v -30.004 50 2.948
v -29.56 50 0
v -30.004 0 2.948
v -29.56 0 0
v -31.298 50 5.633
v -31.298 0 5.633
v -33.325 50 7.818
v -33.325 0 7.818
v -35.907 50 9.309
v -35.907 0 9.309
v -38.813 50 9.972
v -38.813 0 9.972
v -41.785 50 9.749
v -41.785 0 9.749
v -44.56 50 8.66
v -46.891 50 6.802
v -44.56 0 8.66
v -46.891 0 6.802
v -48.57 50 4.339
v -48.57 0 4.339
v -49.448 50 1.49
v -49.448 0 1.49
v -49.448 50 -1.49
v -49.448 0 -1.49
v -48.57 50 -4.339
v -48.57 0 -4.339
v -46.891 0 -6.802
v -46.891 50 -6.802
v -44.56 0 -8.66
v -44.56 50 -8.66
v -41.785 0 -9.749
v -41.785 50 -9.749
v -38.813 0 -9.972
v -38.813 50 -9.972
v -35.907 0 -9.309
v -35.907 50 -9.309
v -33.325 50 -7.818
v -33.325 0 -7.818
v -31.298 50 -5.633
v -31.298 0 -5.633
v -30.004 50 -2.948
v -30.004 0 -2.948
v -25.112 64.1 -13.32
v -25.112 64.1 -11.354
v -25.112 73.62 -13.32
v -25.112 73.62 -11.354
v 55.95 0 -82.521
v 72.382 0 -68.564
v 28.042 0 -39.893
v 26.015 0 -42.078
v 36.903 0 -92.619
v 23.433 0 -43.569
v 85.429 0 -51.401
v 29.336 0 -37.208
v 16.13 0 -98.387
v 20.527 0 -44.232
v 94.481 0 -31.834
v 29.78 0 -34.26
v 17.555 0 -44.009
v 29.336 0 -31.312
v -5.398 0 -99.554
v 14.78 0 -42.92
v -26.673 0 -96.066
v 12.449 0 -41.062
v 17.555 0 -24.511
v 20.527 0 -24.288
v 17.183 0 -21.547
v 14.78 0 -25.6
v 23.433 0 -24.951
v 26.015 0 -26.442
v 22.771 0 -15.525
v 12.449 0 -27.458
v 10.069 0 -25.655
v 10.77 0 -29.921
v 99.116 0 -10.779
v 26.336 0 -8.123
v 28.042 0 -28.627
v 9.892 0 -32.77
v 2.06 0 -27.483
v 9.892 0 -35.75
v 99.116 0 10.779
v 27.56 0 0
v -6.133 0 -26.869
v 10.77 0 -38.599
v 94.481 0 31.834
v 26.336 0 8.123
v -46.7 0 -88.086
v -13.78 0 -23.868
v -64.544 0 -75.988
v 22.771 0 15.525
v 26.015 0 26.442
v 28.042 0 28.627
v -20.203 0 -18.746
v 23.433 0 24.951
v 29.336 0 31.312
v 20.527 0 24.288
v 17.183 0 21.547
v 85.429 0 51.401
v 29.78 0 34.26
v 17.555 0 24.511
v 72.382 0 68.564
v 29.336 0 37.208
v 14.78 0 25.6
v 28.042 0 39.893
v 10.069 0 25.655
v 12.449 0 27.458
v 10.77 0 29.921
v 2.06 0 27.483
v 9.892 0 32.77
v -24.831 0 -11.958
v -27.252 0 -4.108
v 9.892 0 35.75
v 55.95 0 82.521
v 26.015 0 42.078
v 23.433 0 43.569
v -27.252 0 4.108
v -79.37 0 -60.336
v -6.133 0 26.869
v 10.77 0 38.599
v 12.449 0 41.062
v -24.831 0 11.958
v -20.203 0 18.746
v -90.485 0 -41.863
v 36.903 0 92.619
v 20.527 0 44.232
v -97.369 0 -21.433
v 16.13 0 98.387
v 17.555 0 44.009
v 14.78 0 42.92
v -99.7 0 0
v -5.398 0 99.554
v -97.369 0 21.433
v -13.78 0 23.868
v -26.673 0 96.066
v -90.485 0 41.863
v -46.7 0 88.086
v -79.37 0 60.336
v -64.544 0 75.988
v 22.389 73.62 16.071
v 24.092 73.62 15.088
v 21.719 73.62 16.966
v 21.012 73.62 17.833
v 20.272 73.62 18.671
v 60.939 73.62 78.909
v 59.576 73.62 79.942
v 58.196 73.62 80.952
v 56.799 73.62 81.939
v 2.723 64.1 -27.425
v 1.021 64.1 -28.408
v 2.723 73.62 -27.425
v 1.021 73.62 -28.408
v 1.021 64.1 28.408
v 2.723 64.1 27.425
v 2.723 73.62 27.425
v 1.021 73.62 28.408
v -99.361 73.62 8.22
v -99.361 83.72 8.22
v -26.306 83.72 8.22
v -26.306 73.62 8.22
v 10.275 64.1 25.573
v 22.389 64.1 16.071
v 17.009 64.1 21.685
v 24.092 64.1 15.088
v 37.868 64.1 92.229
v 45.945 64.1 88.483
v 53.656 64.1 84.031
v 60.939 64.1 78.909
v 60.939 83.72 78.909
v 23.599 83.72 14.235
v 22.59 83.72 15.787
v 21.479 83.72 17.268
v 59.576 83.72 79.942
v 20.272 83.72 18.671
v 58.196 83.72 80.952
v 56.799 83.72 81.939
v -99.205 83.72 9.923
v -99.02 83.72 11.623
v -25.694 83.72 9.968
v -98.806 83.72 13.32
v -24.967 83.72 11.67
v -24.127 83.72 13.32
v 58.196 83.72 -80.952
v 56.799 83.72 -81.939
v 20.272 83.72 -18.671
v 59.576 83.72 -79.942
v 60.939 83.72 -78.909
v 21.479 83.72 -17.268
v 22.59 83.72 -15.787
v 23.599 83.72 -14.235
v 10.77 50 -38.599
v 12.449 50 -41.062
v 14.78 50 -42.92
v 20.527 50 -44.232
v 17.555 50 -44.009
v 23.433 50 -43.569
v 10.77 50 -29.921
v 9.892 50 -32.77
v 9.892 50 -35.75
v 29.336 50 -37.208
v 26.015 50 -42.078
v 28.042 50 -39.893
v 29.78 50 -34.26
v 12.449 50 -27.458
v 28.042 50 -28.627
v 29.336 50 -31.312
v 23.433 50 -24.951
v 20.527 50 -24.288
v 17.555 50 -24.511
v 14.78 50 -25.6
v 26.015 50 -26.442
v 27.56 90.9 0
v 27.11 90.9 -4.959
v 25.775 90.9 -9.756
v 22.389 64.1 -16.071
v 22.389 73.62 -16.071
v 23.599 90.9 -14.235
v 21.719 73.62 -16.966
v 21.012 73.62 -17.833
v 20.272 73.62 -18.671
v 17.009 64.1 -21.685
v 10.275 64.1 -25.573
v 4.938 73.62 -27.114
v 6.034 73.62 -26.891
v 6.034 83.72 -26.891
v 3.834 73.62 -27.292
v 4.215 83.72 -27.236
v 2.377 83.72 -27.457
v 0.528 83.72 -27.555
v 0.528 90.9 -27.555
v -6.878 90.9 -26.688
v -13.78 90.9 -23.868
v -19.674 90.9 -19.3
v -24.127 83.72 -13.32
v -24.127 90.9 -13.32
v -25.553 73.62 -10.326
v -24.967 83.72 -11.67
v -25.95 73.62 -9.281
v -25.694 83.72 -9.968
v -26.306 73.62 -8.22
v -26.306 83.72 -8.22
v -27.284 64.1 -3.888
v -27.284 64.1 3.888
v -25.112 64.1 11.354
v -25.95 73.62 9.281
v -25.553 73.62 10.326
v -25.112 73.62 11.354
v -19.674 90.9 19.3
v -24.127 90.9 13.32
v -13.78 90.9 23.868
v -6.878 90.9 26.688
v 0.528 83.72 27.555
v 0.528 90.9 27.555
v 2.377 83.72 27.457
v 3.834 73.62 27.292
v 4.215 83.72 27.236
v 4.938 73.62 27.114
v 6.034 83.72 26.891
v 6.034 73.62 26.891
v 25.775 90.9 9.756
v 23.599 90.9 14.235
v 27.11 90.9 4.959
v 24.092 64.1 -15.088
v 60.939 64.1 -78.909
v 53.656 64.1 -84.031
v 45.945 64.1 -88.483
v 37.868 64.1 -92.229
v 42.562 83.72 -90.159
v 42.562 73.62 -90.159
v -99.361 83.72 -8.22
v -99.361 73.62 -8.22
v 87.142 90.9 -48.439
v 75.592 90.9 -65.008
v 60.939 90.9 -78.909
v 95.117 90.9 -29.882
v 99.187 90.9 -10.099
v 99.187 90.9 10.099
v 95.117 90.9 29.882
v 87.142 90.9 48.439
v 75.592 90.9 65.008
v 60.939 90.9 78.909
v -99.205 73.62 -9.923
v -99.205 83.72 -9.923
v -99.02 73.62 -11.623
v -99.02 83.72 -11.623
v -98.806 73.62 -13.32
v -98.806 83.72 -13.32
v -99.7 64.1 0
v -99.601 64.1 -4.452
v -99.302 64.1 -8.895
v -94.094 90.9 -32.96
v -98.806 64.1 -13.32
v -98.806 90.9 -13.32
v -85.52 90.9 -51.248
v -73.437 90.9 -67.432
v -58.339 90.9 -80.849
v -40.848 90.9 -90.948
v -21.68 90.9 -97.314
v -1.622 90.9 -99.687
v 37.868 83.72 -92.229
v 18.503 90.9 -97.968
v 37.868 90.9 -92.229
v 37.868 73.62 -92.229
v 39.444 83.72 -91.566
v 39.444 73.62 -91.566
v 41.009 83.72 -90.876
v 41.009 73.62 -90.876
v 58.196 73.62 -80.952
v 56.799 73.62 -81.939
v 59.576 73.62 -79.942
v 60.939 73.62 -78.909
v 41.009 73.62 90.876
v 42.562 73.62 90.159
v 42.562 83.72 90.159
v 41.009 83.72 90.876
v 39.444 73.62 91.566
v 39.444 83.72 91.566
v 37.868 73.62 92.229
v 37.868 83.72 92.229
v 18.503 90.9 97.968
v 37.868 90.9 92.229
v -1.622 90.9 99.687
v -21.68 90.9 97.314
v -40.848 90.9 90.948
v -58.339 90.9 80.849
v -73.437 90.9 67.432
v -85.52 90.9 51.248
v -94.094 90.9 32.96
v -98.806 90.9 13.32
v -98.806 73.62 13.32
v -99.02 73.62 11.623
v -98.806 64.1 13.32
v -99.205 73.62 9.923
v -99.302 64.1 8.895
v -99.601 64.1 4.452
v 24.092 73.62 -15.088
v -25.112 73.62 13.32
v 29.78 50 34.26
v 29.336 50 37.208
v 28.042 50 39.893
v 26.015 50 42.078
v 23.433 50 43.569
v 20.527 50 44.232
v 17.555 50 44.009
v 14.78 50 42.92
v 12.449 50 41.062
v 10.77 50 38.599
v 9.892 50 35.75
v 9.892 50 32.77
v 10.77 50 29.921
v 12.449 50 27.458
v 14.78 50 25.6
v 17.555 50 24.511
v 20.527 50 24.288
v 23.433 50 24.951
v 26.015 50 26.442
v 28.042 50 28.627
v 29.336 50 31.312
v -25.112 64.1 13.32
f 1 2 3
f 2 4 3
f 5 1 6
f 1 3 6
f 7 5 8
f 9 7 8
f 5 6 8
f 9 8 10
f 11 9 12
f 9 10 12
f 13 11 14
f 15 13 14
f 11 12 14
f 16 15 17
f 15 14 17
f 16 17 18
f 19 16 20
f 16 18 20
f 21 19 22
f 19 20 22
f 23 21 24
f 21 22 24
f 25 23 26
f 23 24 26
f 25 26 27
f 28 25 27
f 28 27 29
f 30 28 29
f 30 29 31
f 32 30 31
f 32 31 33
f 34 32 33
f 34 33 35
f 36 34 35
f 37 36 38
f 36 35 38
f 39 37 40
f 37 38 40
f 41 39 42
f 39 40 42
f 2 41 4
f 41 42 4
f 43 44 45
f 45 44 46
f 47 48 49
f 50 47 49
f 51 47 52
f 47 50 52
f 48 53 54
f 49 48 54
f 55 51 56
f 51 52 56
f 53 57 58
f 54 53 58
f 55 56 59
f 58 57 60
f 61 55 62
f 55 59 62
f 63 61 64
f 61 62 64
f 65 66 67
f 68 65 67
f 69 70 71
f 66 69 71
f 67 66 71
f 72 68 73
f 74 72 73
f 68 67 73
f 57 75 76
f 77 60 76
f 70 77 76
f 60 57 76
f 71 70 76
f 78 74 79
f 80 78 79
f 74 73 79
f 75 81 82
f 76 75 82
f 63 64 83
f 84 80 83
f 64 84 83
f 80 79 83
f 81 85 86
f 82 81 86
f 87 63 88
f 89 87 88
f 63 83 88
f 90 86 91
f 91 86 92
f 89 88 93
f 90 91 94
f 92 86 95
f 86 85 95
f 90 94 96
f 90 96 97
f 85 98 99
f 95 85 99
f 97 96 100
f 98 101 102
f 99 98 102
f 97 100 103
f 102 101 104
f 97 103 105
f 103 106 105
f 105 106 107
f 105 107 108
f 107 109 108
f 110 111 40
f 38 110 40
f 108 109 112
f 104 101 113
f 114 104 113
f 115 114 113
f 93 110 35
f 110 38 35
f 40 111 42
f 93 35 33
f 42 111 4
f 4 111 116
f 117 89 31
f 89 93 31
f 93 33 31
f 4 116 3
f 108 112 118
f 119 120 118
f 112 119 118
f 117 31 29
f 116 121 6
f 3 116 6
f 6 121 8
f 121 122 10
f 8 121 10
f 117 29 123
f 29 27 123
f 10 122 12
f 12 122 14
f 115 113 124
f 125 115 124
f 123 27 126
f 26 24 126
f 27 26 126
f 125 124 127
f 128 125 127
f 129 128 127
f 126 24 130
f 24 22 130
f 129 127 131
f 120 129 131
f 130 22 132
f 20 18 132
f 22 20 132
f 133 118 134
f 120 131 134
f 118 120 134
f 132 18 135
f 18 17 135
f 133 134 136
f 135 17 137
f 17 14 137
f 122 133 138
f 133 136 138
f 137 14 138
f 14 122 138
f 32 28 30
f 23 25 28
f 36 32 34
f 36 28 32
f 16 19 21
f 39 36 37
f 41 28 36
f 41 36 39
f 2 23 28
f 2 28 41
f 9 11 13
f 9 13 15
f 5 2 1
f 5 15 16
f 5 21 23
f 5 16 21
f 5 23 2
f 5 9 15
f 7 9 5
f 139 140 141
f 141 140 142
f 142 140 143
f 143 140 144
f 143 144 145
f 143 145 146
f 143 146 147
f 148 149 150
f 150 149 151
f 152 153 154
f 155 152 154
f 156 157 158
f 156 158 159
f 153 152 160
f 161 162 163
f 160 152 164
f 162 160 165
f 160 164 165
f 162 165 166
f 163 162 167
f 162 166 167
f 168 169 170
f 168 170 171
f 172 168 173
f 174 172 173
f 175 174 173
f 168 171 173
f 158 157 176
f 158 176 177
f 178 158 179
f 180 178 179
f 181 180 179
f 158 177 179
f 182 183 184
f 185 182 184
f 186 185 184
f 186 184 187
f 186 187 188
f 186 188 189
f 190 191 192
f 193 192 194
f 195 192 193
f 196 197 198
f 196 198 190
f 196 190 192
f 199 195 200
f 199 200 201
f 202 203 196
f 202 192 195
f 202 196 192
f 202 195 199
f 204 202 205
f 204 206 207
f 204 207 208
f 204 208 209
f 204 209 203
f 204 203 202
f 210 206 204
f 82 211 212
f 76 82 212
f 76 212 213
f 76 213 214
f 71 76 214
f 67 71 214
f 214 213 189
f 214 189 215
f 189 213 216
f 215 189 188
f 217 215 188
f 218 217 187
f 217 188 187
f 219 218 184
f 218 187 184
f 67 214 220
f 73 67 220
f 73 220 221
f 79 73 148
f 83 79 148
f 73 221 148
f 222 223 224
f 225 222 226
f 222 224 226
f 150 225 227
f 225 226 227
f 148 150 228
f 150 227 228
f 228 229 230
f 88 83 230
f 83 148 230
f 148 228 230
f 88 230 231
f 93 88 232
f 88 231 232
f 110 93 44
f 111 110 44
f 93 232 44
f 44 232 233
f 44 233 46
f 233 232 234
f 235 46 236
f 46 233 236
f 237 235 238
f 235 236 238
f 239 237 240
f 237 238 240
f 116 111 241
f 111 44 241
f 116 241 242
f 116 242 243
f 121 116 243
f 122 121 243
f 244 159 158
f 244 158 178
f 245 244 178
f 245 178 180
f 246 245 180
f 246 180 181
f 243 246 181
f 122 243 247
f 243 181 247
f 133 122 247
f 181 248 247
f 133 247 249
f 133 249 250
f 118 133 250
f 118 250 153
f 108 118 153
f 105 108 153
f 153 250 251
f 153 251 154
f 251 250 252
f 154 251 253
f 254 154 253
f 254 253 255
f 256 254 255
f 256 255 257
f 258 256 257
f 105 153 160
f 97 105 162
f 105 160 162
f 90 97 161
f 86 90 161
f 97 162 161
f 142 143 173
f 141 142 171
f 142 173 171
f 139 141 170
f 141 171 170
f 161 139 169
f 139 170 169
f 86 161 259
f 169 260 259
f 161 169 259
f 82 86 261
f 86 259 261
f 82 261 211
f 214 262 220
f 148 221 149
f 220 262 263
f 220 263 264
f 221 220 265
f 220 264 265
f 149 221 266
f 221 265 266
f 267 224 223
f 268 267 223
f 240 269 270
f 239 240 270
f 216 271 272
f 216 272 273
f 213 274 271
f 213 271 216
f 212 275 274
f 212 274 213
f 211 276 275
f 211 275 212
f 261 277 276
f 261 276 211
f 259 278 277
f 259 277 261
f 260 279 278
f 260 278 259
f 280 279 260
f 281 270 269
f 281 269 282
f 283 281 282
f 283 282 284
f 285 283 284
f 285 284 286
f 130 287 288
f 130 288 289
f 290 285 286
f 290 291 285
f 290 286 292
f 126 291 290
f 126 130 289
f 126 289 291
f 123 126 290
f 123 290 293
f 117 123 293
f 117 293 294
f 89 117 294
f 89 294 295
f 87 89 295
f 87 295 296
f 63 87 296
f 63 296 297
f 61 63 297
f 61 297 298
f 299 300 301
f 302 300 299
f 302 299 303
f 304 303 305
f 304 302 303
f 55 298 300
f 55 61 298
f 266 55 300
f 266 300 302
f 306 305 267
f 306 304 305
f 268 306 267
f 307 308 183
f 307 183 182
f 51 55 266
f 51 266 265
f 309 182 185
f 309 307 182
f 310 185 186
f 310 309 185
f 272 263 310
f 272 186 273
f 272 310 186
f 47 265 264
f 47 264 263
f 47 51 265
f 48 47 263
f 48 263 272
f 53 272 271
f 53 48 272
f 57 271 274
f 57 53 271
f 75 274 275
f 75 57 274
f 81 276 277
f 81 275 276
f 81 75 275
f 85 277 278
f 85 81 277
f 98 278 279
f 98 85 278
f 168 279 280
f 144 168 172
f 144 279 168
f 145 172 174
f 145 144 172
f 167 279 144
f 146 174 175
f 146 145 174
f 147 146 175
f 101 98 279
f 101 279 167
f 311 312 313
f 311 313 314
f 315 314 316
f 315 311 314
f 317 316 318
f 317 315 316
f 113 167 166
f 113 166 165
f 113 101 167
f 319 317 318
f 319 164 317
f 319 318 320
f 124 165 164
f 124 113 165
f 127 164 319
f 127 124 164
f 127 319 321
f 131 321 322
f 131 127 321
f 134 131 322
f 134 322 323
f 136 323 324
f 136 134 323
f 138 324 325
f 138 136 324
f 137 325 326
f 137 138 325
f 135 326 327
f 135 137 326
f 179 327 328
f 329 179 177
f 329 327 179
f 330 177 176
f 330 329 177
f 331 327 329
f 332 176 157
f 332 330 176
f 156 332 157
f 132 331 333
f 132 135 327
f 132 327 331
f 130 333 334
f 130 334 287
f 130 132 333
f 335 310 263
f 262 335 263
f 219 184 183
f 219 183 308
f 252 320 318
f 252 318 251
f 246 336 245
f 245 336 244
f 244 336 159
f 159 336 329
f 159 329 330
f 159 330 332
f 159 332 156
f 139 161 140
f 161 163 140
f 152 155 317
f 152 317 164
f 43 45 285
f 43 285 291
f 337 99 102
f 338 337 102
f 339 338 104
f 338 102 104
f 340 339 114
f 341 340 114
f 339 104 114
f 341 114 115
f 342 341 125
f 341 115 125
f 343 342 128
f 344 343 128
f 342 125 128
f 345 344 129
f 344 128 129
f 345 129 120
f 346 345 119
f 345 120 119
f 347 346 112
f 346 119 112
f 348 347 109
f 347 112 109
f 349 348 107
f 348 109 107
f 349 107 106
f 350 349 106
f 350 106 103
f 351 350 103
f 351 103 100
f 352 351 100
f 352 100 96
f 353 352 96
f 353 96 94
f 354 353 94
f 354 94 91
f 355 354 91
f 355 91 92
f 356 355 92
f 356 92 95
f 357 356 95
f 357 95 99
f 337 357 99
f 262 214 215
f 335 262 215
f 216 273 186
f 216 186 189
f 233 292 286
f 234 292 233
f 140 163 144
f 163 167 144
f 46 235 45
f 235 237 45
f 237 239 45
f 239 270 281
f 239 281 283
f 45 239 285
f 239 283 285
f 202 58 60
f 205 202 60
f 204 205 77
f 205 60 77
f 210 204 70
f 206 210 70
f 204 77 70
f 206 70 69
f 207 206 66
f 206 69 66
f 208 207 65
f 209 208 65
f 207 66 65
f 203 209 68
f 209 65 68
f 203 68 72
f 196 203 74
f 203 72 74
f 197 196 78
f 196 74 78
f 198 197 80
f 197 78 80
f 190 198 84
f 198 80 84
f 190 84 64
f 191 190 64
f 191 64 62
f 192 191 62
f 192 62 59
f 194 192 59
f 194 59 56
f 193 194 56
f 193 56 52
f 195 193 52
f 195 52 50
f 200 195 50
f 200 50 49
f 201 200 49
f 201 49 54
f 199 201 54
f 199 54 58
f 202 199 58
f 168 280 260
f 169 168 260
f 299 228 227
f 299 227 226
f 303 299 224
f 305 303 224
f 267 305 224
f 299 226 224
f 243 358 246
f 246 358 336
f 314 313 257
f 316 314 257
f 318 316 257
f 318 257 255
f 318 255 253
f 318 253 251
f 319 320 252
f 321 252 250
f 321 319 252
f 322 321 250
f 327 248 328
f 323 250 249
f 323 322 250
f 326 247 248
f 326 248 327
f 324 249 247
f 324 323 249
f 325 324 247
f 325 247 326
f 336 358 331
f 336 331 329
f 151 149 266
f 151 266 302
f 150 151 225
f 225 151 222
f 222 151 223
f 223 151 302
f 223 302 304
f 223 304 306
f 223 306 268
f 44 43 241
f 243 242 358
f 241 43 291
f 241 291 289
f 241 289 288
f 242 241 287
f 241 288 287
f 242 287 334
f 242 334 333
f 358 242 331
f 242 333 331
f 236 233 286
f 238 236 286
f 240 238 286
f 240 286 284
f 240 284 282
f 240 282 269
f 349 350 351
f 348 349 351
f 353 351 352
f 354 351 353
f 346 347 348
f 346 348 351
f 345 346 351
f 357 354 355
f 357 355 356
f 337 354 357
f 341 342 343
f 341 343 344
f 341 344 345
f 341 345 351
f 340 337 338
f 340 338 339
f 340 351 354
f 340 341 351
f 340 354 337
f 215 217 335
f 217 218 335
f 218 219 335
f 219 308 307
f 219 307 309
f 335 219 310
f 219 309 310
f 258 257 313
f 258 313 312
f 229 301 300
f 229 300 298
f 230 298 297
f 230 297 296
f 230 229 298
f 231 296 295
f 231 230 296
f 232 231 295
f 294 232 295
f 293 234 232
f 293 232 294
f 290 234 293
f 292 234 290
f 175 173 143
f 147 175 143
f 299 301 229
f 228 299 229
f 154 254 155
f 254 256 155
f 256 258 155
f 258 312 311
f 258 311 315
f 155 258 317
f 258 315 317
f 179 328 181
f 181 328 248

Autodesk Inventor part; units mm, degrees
ref_plane "XZ Plane" through (0, 0, 0) normal (0, 1, 0) x (-1, 0, 0)
ref_plane "XY Plane" through (0, 0, 0) normal (0, 0, 1) x (1, 0, 0)
sketch "Sketch1" plane through (0, 0, 0) normal (0, 1, 0) x (-1, 0, 0)
  circle A0 centre (0, 0) radius 99.7
extrude "Extrusion1" add sketch "Sketch1" along normal blind 90.9
sketch "Sketch2" plane through (0, 90.9, 0) normal (0, 1, 0) x (1, 0, 0)
  circle A0 centre (0, 0) radius 27.56
  dimension "d3" = 55.12
extrude "Extrusion2" cut sketch "Sketch2" against normal blind 90.9
sketch "Sketch3" plane through (0, 90.9, 0) normal (0, 1, 0) x (1, 0, 0)
  circle A0 centre (0, 0) radius 99.7 projected
  line L0 (-99.7, 0) -> (-98.8062, 13.32)
  line L1 (-98.8062, 13.32) -> (-24.1274, 13.32)
  circle A1 centre (0, 0) radius 27.56 projected
  line L2 (-99.7, 0) -> (-98.8062, -13.32)
  line L3 (-98.8062, -13.32) -> (-24.1274, -13.32)
  line L4 (37.8676, -92.2287) -> (0.5282, -27.5549)
  line L5 (49.85, -86.3427) -> (37.8676, -92.2287)
  line L6 (49.85, -86.3427) -> (60.9386, -78.9087)
  line L7 (60.9386, -78.9087) -> (23.5992, -14.2349)
  line L8 (60.9386, 78.9087) -> (23.5992, 14.2349)
  line L9 (49.85, 86.3427) -> (60.9386, 78.9087)
  line L10 (49.85, 86.3427) -> (37.8676, 92.2287)
  line L11 (37.8676, 92.2287) -> (0.5282, 27.5549)
  line L12 (-24.1274, 13.32) -> (-24.1274, -13.32)
  line L13 (0.5282, 27.5549) -> (23.5992, 14.2349)
  line L14 (23.5992, -14.2349) -> (0.5282, -27.5549)
  dimension "d6" = 13.35
  dimension "d15" = 360
extrude "Extrusion6" cut sketch "Sketch3" against normal blind 7.18 contours L8 A1 L11 L10 L9 | L6 L5 L4 A1 L7 | L13 A1 | A1 L14 | L1 A1 L3 L2 L0
sketch "Sketch7" plane through (49.85, 83.72, -86.3427) normal (-0.5569, 0, 0.8306) x (0.8306, 0, 0.5569)
  line L0 (13.35, 7.18) -> (0, 7.18) projected
  line L1 (13.35, 0) -> (13.35, 7.18) projected
  line L2 (0, 7.18) -> (13.35, 7.18)
  line L3 (13.35, 0) -> (18.3498, 0) projected
  line L4 (13.35, 7.18) -> (13.35, 0)
  line L5 (0, 7.18) -> (0, 0) projected
  line L6 (13.35, 0) -> (0, 0)
  line L7 (0, 0) -> (0, 6.2119)
  line L8 (0, 7.18) -> (-13.2303, 7.18) projected
  line L9 (-13.2303, 4.6736) -> (0, 7.18)
  line L10 (0, 7.18) -> (0, 0)
  line L11 (-13.2303, -2.9965) -> (-13.2303, 4.6736)
  line L12 (-13.2303, 0) -> (-13.2303, 7.18) projected
  point P0 (6.675, -83.72)
extrude "Extrusion7" cut sketch "Sketch7" against normal blind 10 contours L1 L6 L5 L0
sketch "Sketch8" plane through (37.8676, 83.72, -92.2287) normal (-0.4409, 0, 0.8976) x (0.8976, 0, 0.4409)
  line L0 (0, 0) -> (0, 7.18) projected
  line L1 (-4.9998, 0) -> (0, 0) projected
  line L2 (0, 7.18) -> (0, 0)
  line L3 (0, 0) -> (13.35, 0) projected
  line L4 (0, 0) -> (13.35, 0)
  line L5 (13.35, 7.18) -> (13.35, 0) projected
  line L6 (13.35, 0) -> (13.35, 7.18)
  line L7 (0, 7.18) -> (13.35, 7.18) projected
  line L8 (13.35, 7.18) -> (0, 7.18)
  line L9 (0, 7.18) -> (0, 4.7035)
  point P0 (6.675, -83.72)
extrude "Extrusion8" cut sketch "Sketch8" against normal blind 10
sketch "Sketch10" plane through (49.85, 83.72, 86.3427) normal (-0.4409, 0, -0.8976) x (-0.8976, 0, 0.4409)
  line L0 (0, 7.18) -> (13.35, 7.18) projected
  line L1 (13.35, 7.18) -> (18.3498, 7.18) projected
  line L2 (0, 7.18) -> (13.35, 7.18)
  line L3 (13.35, 0) -> (18.3498, 0) projected
  line L4 (13.35, 7.18) -> (13.35, 0)
  line L5 (0, 0) -> (13.35, 0) projected
  line L6 (13.35, 0) -> (0, 0)
  line L7 (0, 0) -> (0, 7.18)
  line L8 (0, 7.18) -> (0, 0) projected
  point P0 (6.675, -83.72)
extrude "Extrusion9" cut sketch "Sketch10" against normal blind 10
sketch "Sketch11" plane through (60.9386, 83.72, 78.9087) normal (-0.5569, 0, -0.8306) x (-0.8306, 0, 0.5569)
  line L0 (-4.9998, 7.18) -> (0, 7.18) projected
  line L1 (96.1615, 7.18) -> (0, 7.18) projected
  line L2 (0, 7.18) -> (13.35, 7.18)
  line L3 (0, 0) -> (13.35, 0) projected
  line L4 (13.35, 7.18) -> (13.35, 0)
  line L5 (13.35, 0) -> (0, 0)
  line L6 (0, 0) -> (0, 7.18) projected
  line L7 (0, 0) -> (0, 7.18)
  point P0 (6.675, -83.72)
extrude "Extrusion10" cut sketch "Sketch11" against normal blind 10
sketch "Sketch12" plane through (0, 90.9, 0) normal (0, 1, 0) x (1, 0, 0)
  arc A0 (37.8676, -92.2287) -> (60.9386, -78.9087) centre (0, 0) ccw projected
  arc A1 (-99.7, 0) -> (-98.8062, -13.32) centre (0, 0) ccw projected
  arc A2 (60.9386, 78.9087) -> (37.8676, 92.2287) centre (0, 0) ccw projected
  circle A3 centre (0, 0) radius 99.7 projected
  arc A4 (-98.8062, -13.32) -> (37.8676, -92.2287) centre (0, 0) ccw projected
  arc A5 (-98.8062, 13.32) -> (-99.7, 0) centre (0, 0) ccw projected
  arc A6 (37.8676, 92.2287) -> (-98.8062, 13.32) centre (0, 0) ccw projected
  arc A7 (60.9386, -78.9087) -> (60.9386, 78.9087) centre (0, 0) ccw projected
  point P0 (-99.7, 0)
sketch "Sketch13" plane through (0, 83.72, 0) normal (0, 1, 0) x (1, 0, 0)
  arc A0 (60.9386, 78.9087) -> (37.8676, 92.2287) centre (0, 0) ccw projected
ref_plane "Work Plane10" through (-99.7, 0, 0) normal (1, 0, 0) x (0, 1, 0)
sketch "Sketch16" plane through (-99.7, 0, 0) normal (1, 0, 0) x (0, 1, 0)
  line L0 (83.72, 0) -> (83.72, -13.32) projected
  line L1 (83.72, -8.22) -> (73.62, -8.22)
  line L2 (83.72, 13.32) -> (83.72, 0) projected
  line L3 (83.72, 8.22) -> (73.62, 8.22)
  line L4 (73.62, -8.22) -> (73.62, -13.32)
  line L5 (73.62, -13.32) -> (64.1, -13.32)
  line L6 (64.1, -13.32) -> (64.1, 13.32)
  line L7 (64.1, 13.32) -> (73.62, 13.32)
  line L8 (73.62, 13.32) -> (73.62, 8.22)
  line L9 (83.72, -8.22) -> (83.72, 8.22)
  point P0 (0, 0)
  dimension "d36" = 9.52
extrude "Extrusion11" cut sketch "Sketch16" along normal blind 74.5875
sketch "Sketch18" plane through (-98.8062, 83.72, -13.32) normal (0.9978, 0, 0.067) x (0.067, 0, -0.9978)
  line L0 (0, 0) -> (0, 7.18) projected
  line L1 (0, 7.18) -> (0, 0)
  arc A0 (0, 0) -> (-2.79, 0) centre (-1.395, 0) ccw
  line L2 (-13.35, 0) -> (-21.5289, 0) projected
  line L3 (-2.79, 0) -> (-13.35, 0)
  arc A1 (-13.35, 2.7204) -> (-13.35, 0) centre (-13.35, 1.3602) ccw
  line L4 (-13.35, 2.7204) -> (-13.35, 7.18)
  line L5 (-19.298, 7.18) -> (9.1079, 7.18) projected
  point P0 (-6.675, -83.72)
extrude "Extrusion12" cut sketch "Sketch18" along normal blind 74.5875
sketch "Sketch20" plane through (-99.7, 0, 0) normal (1, 0, 0) x (0, 1, 0)
  line L0 (90.9, 0) -> (90.9, -13.32) projected
  line L1 (83.72, -13.32) -> (90.9, -13.32) projected
  line L2 (90.9, -13.32) -> (83.72, -13.32)
  line L3 (83.72, 8.22) -> (83.72, 13.32) projected
  line L4 (83.72, -13.32) -> (83.72, 13.32)
  line L5 (83.72, 13.32) -> (90.9, 13.32)
  line L6 (90.9, 13.32) -> (90.9, -13.32)
  point P0 (0, 0)
extrude "Extrusion13" cut sketch "Sketch20" along normal blind 10
pattern_circular "Circular Pattern1" count 3 over 360 about axis through (0, 90.9, 0) along (0, -1, 0) of "Extrusion11"
sketch "Sketch21" plane through (0, 0, 0) normal (0, -1, 0) x (1, 0, 0)
  arc A0 (-98.8062, -13.32) -> (37.8676, -92.2287) centre (0, 0) ccw projected
  circle A1 centre (-39.56, 0) radius 10
  circle A2 centre (19.78, -34.26) radius 10
  circle A3 centre (19.78, 34.26) radius 10
  point P0 (-25.1125, 13.32)
  dimension "d50" = 360
extrude "Extrusion14" cut sketch "Sketch21" against normal blind 50
properties part number "3 jaww" material "Steel"
